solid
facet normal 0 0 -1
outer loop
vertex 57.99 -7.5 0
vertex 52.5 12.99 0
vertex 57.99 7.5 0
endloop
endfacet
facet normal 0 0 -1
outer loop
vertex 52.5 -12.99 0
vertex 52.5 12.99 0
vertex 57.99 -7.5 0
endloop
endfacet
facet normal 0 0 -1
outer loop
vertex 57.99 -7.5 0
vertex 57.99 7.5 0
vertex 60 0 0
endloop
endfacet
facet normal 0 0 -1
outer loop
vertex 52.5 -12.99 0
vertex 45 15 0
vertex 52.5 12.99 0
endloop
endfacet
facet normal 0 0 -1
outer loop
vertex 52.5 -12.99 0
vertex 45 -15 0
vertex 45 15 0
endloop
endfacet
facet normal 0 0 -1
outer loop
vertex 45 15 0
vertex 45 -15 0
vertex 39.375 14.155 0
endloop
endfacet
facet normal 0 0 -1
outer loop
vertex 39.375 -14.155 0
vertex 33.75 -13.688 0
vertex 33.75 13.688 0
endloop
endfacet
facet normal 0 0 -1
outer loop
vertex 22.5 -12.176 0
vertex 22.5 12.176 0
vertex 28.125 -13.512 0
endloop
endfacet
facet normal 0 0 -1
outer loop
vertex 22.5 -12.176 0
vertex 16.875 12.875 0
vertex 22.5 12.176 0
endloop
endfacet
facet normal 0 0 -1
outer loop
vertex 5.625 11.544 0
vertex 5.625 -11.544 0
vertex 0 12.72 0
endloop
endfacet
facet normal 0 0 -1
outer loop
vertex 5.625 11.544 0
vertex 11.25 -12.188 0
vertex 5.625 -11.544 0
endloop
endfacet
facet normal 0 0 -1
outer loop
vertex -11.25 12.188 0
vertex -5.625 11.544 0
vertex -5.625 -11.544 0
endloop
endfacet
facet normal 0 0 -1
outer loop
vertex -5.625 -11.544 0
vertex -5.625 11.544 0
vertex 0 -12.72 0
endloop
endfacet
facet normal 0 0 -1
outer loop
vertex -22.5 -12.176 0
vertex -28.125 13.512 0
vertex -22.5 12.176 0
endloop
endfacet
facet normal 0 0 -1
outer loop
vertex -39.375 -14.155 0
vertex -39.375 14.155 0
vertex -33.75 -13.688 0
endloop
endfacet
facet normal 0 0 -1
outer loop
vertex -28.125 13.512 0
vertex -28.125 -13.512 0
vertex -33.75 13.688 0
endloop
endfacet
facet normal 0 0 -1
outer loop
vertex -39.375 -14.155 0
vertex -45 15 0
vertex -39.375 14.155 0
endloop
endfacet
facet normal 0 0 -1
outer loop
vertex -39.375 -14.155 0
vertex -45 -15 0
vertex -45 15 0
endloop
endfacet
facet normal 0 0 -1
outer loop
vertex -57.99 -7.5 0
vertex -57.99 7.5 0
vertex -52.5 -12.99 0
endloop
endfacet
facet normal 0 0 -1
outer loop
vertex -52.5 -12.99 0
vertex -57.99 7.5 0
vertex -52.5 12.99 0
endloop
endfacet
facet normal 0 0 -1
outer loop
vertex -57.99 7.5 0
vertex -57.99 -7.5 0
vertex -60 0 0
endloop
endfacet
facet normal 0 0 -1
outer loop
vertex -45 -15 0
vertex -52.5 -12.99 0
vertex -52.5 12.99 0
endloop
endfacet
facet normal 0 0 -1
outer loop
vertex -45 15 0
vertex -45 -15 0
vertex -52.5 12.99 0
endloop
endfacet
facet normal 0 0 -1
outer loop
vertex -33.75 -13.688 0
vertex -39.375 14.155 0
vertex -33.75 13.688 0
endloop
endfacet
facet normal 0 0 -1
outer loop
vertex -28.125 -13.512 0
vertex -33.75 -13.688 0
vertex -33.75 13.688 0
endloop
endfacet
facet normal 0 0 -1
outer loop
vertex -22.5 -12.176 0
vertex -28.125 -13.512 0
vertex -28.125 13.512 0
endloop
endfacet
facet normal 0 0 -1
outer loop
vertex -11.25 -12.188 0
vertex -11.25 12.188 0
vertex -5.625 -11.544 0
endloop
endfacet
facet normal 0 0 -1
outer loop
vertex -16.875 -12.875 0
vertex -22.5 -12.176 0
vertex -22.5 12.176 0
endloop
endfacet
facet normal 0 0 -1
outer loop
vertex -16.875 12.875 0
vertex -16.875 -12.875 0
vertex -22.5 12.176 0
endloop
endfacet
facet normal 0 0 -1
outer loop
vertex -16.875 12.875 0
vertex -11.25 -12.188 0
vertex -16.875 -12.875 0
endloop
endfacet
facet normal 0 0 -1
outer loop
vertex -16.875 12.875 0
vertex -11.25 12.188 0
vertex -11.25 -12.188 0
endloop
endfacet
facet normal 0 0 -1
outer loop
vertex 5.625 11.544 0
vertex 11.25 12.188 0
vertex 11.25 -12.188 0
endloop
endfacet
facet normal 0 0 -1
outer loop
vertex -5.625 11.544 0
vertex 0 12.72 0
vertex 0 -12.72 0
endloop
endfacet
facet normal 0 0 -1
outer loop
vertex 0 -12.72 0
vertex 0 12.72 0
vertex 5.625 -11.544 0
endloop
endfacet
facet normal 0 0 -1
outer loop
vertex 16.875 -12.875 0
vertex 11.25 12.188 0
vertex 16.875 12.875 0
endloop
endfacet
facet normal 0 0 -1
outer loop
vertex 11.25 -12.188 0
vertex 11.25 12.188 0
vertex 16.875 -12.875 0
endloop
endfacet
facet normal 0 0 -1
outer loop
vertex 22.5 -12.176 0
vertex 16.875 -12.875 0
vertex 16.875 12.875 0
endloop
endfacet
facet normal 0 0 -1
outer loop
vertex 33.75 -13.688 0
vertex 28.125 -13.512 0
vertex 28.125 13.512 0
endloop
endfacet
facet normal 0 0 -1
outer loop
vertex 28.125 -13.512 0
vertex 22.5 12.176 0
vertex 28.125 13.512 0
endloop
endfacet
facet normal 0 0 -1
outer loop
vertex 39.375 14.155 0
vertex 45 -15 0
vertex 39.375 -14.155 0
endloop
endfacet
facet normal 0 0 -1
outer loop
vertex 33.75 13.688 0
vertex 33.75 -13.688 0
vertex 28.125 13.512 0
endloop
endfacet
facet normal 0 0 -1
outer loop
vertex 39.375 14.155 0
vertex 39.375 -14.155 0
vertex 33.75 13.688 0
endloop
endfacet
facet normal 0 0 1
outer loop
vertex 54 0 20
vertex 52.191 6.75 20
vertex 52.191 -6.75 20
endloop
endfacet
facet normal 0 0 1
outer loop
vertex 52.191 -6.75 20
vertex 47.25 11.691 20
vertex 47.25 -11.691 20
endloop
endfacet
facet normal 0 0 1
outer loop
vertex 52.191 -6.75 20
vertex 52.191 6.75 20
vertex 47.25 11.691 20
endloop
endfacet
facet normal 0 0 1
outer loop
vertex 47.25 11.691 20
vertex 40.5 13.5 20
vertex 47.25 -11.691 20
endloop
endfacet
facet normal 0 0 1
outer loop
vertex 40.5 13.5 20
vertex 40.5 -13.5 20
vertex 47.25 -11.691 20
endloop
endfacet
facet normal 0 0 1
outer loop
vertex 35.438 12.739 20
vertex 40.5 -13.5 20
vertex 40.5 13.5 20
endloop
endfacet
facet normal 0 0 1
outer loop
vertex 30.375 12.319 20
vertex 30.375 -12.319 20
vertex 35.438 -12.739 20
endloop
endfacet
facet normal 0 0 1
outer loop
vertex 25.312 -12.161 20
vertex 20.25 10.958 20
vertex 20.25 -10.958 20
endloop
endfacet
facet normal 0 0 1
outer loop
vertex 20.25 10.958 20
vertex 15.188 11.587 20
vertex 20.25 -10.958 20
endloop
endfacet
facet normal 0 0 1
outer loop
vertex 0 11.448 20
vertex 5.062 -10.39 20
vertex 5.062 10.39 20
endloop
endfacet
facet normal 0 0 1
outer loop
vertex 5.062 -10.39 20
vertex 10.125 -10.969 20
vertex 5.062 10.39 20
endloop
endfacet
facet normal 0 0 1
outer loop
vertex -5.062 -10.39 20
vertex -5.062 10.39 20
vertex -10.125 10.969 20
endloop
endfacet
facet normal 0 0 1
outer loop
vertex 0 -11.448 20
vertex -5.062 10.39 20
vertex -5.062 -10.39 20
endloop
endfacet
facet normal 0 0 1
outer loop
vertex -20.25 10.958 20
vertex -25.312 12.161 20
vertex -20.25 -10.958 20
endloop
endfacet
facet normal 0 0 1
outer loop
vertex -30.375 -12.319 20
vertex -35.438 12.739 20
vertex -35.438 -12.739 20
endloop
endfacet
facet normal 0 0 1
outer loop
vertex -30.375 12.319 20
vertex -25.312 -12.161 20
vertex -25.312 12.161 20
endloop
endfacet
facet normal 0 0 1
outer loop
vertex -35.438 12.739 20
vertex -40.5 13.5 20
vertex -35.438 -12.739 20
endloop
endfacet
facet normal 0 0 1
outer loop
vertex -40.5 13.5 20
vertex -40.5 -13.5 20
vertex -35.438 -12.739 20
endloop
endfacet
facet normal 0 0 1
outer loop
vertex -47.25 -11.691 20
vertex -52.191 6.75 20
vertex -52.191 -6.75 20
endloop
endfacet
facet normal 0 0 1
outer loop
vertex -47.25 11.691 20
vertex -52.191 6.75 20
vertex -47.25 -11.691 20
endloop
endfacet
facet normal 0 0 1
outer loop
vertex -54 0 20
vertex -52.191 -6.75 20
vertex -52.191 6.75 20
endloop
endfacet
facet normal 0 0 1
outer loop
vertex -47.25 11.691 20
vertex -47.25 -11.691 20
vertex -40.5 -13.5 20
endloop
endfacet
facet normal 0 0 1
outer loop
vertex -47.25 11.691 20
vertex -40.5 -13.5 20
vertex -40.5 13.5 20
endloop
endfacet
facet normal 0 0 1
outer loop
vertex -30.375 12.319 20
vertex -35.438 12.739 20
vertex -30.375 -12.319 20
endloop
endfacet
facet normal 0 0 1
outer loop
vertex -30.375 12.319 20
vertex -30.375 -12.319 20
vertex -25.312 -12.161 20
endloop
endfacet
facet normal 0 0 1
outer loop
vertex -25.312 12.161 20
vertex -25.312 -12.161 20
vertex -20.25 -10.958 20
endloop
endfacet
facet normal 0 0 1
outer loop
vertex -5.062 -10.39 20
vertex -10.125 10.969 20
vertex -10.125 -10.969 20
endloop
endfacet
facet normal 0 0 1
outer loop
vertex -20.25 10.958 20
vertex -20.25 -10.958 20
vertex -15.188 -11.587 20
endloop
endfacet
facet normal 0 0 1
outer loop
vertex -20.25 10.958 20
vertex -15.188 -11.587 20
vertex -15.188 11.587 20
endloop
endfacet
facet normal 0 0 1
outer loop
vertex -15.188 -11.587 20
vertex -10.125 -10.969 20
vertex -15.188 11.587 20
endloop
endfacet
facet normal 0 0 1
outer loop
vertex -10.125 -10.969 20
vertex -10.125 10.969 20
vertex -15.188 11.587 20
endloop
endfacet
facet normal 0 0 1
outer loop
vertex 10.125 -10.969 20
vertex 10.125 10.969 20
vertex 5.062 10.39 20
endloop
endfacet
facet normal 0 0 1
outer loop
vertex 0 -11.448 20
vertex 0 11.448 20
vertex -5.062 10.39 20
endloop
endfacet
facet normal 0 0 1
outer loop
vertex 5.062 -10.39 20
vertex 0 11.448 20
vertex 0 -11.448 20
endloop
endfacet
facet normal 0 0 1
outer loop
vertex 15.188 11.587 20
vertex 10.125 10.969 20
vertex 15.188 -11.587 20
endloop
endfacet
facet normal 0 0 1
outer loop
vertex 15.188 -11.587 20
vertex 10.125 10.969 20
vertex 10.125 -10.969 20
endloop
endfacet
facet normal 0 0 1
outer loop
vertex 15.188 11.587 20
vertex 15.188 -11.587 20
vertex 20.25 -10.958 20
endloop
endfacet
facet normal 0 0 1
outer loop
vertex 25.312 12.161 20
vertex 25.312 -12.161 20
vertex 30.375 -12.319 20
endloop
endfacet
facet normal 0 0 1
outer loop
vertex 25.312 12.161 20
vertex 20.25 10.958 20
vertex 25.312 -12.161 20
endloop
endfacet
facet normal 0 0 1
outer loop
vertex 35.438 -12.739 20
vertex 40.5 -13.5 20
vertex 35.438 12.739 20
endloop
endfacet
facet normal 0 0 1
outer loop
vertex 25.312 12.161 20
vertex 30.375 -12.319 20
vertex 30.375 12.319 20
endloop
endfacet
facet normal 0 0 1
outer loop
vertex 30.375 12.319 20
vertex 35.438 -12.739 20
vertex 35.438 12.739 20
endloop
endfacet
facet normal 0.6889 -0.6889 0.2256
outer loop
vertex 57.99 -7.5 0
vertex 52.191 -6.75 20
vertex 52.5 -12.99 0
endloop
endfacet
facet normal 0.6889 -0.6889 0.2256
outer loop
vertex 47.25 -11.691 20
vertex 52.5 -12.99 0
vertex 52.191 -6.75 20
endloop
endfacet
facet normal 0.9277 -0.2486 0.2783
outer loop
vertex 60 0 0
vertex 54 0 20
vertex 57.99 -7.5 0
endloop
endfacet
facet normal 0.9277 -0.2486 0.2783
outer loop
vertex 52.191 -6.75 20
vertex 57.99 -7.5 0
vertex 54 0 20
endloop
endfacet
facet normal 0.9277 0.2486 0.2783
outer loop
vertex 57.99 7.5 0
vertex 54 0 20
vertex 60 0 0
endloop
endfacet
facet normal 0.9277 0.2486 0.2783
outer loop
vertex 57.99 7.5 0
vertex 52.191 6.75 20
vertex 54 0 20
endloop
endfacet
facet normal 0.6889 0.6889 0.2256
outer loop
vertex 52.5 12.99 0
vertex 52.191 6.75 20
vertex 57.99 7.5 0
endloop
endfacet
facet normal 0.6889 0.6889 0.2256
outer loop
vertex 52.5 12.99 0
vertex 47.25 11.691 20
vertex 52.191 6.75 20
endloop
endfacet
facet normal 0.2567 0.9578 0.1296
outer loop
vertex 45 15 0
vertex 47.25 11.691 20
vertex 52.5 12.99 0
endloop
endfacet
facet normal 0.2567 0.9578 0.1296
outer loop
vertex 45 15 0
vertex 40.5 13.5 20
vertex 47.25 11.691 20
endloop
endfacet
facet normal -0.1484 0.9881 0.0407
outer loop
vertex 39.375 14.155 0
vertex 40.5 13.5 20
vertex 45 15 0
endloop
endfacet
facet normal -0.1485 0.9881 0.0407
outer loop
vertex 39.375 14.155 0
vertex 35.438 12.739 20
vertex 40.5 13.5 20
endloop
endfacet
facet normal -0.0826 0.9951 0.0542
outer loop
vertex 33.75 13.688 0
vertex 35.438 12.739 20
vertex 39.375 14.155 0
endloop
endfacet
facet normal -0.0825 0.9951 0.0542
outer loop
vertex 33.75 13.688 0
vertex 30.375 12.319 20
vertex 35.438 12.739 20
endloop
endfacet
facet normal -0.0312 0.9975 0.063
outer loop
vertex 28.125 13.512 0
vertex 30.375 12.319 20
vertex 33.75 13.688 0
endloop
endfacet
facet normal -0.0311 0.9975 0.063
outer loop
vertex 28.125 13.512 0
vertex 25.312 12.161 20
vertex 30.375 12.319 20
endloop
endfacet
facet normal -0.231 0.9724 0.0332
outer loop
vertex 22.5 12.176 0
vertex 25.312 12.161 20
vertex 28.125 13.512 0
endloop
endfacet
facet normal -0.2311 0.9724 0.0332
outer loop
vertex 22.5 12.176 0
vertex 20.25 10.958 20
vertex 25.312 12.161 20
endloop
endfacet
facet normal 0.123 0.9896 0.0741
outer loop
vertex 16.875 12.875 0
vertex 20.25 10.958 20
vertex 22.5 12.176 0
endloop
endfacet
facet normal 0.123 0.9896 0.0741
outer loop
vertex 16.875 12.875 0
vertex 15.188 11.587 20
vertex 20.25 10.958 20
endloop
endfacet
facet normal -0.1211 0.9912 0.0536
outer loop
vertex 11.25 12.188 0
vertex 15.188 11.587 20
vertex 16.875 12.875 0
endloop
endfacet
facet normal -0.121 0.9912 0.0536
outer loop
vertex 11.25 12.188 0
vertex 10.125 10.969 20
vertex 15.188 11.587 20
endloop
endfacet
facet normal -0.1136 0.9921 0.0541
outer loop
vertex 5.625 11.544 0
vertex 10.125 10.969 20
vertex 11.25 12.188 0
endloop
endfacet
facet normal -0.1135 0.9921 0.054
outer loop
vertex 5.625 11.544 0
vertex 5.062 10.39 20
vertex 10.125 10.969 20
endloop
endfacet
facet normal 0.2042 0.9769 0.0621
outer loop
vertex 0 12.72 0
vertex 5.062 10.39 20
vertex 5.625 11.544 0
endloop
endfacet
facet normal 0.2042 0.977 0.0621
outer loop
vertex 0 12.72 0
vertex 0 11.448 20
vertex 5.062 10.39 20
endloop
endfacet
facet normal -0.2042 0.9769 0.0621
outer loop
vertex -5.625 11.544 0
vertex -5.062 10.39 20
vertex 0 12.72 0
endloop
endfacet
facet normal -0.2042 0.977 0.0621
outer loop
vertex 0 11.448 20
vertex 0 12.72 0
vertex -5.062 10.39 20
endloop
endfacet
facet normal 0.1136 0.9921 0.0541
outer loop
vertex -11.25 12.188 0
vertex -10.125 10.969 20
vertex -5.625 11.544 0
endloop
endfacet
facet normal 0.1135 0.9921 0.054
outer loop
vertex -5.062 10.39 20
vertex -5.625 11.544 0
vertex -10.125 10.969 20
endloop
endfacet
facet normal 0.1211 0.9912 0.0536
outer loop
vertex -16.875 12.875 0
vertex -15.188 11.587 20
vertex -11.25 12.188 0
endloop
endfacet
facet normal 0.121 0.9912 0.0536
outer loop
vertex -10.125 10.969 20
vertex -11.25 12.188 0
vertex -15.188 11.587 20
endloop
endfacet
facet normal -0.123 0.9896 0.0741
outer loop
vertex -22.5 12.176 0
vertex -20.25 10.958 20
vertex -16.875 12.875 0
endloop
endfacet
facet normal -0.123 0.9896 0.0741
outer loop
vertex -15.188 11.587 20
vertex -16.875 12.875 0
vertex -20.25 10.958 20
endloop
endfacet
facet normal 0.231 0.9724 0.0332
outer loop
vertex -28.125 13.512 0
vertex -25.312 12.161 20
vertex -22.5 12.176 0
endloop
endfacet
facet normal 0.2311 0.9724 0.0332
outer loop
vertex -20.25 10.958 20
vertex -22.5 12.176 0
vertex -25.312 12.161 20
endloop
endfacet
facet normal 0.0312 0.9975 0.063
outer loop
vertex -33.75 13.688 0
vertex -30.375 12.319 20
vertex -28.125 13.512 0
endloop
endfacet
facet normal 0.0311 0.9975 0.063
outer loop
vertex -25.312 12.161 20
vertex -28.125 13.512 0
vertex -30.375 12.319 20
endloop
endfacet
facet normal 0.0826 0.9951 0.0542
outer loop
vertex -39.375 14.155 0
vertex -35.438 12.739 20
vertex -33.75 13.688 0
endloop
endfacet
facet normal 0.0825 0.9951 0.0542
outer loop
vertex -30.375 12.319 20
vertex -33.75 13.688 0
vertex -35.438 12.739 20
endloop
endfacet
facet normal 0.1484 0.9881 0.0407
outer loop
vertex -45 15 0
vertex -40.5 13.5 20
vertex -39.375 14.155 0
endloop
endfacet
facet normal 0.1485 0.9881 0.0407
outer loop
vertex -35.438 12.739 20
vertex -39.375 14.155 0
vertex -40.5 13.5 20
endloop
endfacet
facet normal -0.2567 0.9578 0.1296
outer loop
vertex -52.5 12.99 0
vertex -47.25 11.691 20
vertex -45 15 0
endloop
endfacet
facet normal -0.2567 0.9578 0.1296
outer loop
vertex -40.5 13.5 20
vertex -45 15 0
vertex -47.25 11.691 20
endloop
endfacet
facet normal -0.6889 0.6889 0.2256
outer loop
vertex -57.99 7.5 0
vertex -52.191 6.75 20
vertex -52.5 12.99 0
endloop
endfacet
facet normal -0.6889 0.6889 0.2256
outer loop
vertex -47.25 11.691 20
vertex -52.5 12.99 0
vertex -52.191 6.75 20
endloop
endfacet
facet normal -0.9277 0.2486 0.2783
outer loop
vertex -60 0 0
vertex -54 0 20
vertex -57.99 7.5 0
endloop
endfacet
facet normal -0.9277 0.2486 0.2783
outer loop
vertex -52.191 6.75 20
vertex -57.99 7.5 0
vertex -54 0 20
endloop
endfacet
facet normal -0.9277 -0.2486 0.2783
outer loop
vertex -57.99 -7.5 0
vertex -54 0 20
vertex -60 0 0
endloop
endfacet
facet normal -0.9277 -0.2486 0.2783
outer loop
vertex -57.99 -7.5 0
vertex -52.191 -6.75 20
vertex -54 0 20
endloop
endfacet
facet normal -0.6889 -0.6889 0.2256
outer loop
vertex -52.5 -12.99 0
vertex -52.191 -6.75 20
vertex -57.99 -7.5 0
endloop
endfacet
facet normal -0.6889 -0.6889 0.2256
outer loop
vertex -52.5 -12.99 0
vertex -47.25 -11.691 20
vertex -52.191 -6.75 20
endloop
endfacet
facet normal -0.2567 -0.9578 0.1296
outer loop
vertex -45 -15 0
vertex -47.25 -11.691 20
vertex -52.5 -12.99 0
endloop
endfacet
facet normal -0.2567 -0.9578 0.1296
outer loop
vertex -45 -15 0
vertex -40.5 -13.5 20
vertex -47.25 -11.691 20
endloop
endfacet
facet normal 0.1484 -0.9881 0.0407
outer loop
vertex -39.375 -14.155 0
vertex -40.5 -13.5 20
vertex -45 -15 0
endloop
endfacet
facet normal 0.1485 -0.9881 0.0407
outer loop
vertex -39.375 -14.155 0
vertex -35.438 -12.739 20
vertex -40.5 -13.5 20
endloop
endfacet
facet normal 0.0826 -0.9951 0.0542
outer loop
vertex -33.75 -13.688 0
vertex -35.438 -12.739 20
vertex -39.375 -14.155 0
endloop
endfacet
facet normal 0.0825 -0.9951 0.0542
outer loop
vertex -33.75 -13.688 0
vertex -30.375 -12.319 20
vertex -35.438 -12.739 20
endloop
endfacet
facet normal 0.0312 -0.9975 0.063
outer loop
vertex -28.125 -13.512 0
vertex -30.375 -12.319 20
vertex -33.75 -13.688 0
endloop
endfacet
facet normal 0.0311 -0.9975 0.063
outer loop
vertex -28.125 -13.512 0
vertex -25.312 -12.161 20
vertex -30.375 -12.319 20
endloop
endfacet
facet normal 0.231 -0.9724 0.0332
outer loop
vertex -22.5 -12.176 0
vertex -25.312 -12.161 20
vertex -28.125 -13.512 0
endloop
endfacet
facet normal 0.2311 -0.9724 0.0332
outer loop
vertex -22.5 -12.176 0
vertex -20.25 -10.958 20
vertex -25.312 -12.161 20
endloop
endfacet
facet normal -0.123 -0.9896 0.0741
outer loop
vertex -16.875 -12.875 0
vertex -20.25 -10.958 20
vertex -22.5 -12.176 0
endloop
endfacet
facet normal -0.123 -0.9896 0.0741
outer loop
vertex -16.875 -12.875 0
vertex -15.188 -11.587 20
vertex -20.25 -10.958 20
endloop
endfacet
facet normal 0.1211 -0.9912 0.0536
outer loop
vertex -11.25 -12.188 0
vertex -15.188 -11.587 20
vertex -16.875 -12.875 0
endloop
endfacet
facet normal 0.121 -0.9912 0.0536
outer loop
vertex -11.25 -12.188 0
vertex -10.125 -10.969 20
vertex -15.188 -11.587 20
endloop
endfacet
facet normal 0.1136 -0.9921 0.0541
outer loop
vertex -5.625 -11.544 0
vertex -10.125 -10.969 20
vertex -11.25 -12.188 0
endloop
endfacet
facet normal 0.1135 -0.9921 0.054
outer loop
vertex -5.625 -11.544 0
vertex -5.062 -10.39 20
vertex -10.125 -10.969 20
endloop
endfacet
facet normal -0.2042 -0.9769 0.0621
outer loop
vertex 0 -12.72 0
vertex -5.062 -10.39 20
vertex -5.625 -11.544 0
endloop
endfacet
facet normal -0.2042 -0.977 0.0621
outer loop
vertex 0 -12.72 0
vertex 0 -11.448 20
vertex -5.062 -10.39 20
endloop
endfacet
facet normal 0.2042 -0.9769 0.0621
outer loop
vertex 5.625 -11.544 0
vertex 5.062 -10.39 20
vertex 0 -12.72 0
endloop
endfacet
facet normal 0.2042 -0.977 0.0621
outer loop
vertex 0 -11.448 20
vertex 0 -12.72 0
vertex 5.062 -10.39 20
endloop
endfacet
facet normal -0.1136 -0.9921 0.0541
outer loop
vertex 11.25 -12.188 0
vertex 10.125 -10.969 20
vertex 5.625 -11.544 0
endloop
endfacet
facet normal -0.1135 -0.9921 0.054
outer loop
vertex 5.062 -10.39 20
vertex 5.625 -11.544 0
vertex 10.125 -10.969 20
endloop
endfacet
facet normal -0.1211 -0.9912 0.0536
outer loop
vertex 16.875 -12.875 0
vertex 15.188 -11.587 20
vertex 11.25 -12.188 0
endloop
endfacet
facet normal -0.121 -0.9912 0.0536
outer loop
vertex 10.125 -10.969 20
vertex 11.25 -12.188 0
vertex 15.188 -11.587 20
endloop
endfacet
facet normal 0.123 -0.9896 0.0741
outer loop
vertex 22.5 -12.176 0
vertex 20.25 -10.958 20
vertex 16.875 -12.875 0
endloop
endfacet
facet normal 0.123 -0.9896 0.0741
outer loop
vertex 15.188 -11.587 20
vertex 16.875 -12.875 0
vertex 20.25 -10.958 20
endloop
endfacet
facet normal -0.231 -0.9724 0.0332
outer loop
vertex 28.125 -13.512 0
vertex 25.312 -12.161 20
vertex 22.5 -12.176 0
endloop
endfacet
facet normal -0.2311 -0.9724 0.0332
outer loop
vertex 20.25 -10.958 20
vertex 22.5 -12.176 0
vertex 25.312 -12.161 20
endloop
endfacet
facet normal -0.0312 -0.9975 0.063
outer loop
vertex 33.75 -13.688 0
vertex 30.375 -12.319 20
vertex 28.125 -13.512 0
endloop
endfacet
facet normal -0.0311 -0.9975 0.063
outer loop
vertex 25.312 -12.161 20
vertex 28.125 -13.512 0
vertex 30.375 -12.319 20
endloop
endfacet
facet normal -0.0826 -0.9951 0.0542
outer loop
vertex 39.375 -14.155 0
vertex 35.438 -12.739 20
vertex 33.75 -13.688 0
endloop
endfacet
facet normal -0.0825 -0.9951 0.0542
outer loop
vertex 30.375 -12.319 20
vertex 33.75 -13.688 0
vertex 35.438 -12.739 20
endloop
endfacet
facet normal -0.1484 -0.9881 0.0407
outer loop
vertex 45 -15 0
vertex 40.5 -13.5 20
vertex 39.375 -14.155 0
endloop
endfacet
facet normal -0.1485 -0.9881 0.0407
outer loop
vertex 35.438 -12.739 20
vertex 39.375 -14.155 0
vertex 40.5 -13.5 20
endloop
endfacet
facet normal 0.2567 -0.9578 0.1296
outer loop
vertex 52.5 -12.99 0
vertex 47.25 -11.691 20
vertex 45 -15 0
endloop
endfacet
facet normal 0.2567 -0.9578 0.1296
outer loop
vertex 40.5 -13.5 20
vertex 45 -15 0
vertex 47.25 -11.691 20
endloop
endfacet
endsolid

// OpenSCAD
$fn = 32;

// ----------------------------------------------------------------------
// Handle: 120 x 30 mm grip, 20 mm thick
// ----------------------------------------------------------------------

// --- parameters (mm) ---
length = 120;             // grip length
width = 30;               // grip width
thickness = 20;           // grip thickness
waist = 0.8;              // width factor at the middle
draft = 0.9;              // top face scale of the extrusion
scallops = 6;             // finger rests per side
ripple = 0.06;            // depth factor of the finger rests

/* ergonomic grip outline, closed spline-like polygon in the XY plane */
grip = [[-45, 15], [-39.375, 14.155], [-33.75, 13.688], [-28.125, 13.512], [-22.5, 12.176], [-16.875, 12.875], [-11.25, 12.188], [-5.625, 11.544], [0, 12.72], [5.625, 11.544], [11.25, 12.188], [16.875, 12.875], [22.5, 12.176], [28.125, 13.512], [33.75, 13.688], [39.375, 14.155], [45, 15], [52.5, 12.99], [57.99, 7.5], [60, 0], [57.99, -7.5], [52.5, -12.99], [45, -15], [45, -15], [39.375, -14.155], [33.75, -13.688], [28.125, -13.512], [22.5, -12.176], [16.875, -12.875], [11.25, -12.188], [5.625, -11.544], [0, -12.72], [-5.625, -11.544], [-11.25, -12.188], [-16.875, -12.875], [-22.5, -12.176], [-28.125, -13.512], [-33.75, -13.688], [-39.375, -14.155], [-45, -15], [-52.5, -12.99], [-57.99, -7.5], [-60, 0], [-57.99, 7.5], [-52.5, 12.99], [-45, 15]];

module grip_body() {
  linear_extrude(height = thickness, scale = draft) polygon(grip);
}

difference() {
  union() {
    grip_body();
  }
}
